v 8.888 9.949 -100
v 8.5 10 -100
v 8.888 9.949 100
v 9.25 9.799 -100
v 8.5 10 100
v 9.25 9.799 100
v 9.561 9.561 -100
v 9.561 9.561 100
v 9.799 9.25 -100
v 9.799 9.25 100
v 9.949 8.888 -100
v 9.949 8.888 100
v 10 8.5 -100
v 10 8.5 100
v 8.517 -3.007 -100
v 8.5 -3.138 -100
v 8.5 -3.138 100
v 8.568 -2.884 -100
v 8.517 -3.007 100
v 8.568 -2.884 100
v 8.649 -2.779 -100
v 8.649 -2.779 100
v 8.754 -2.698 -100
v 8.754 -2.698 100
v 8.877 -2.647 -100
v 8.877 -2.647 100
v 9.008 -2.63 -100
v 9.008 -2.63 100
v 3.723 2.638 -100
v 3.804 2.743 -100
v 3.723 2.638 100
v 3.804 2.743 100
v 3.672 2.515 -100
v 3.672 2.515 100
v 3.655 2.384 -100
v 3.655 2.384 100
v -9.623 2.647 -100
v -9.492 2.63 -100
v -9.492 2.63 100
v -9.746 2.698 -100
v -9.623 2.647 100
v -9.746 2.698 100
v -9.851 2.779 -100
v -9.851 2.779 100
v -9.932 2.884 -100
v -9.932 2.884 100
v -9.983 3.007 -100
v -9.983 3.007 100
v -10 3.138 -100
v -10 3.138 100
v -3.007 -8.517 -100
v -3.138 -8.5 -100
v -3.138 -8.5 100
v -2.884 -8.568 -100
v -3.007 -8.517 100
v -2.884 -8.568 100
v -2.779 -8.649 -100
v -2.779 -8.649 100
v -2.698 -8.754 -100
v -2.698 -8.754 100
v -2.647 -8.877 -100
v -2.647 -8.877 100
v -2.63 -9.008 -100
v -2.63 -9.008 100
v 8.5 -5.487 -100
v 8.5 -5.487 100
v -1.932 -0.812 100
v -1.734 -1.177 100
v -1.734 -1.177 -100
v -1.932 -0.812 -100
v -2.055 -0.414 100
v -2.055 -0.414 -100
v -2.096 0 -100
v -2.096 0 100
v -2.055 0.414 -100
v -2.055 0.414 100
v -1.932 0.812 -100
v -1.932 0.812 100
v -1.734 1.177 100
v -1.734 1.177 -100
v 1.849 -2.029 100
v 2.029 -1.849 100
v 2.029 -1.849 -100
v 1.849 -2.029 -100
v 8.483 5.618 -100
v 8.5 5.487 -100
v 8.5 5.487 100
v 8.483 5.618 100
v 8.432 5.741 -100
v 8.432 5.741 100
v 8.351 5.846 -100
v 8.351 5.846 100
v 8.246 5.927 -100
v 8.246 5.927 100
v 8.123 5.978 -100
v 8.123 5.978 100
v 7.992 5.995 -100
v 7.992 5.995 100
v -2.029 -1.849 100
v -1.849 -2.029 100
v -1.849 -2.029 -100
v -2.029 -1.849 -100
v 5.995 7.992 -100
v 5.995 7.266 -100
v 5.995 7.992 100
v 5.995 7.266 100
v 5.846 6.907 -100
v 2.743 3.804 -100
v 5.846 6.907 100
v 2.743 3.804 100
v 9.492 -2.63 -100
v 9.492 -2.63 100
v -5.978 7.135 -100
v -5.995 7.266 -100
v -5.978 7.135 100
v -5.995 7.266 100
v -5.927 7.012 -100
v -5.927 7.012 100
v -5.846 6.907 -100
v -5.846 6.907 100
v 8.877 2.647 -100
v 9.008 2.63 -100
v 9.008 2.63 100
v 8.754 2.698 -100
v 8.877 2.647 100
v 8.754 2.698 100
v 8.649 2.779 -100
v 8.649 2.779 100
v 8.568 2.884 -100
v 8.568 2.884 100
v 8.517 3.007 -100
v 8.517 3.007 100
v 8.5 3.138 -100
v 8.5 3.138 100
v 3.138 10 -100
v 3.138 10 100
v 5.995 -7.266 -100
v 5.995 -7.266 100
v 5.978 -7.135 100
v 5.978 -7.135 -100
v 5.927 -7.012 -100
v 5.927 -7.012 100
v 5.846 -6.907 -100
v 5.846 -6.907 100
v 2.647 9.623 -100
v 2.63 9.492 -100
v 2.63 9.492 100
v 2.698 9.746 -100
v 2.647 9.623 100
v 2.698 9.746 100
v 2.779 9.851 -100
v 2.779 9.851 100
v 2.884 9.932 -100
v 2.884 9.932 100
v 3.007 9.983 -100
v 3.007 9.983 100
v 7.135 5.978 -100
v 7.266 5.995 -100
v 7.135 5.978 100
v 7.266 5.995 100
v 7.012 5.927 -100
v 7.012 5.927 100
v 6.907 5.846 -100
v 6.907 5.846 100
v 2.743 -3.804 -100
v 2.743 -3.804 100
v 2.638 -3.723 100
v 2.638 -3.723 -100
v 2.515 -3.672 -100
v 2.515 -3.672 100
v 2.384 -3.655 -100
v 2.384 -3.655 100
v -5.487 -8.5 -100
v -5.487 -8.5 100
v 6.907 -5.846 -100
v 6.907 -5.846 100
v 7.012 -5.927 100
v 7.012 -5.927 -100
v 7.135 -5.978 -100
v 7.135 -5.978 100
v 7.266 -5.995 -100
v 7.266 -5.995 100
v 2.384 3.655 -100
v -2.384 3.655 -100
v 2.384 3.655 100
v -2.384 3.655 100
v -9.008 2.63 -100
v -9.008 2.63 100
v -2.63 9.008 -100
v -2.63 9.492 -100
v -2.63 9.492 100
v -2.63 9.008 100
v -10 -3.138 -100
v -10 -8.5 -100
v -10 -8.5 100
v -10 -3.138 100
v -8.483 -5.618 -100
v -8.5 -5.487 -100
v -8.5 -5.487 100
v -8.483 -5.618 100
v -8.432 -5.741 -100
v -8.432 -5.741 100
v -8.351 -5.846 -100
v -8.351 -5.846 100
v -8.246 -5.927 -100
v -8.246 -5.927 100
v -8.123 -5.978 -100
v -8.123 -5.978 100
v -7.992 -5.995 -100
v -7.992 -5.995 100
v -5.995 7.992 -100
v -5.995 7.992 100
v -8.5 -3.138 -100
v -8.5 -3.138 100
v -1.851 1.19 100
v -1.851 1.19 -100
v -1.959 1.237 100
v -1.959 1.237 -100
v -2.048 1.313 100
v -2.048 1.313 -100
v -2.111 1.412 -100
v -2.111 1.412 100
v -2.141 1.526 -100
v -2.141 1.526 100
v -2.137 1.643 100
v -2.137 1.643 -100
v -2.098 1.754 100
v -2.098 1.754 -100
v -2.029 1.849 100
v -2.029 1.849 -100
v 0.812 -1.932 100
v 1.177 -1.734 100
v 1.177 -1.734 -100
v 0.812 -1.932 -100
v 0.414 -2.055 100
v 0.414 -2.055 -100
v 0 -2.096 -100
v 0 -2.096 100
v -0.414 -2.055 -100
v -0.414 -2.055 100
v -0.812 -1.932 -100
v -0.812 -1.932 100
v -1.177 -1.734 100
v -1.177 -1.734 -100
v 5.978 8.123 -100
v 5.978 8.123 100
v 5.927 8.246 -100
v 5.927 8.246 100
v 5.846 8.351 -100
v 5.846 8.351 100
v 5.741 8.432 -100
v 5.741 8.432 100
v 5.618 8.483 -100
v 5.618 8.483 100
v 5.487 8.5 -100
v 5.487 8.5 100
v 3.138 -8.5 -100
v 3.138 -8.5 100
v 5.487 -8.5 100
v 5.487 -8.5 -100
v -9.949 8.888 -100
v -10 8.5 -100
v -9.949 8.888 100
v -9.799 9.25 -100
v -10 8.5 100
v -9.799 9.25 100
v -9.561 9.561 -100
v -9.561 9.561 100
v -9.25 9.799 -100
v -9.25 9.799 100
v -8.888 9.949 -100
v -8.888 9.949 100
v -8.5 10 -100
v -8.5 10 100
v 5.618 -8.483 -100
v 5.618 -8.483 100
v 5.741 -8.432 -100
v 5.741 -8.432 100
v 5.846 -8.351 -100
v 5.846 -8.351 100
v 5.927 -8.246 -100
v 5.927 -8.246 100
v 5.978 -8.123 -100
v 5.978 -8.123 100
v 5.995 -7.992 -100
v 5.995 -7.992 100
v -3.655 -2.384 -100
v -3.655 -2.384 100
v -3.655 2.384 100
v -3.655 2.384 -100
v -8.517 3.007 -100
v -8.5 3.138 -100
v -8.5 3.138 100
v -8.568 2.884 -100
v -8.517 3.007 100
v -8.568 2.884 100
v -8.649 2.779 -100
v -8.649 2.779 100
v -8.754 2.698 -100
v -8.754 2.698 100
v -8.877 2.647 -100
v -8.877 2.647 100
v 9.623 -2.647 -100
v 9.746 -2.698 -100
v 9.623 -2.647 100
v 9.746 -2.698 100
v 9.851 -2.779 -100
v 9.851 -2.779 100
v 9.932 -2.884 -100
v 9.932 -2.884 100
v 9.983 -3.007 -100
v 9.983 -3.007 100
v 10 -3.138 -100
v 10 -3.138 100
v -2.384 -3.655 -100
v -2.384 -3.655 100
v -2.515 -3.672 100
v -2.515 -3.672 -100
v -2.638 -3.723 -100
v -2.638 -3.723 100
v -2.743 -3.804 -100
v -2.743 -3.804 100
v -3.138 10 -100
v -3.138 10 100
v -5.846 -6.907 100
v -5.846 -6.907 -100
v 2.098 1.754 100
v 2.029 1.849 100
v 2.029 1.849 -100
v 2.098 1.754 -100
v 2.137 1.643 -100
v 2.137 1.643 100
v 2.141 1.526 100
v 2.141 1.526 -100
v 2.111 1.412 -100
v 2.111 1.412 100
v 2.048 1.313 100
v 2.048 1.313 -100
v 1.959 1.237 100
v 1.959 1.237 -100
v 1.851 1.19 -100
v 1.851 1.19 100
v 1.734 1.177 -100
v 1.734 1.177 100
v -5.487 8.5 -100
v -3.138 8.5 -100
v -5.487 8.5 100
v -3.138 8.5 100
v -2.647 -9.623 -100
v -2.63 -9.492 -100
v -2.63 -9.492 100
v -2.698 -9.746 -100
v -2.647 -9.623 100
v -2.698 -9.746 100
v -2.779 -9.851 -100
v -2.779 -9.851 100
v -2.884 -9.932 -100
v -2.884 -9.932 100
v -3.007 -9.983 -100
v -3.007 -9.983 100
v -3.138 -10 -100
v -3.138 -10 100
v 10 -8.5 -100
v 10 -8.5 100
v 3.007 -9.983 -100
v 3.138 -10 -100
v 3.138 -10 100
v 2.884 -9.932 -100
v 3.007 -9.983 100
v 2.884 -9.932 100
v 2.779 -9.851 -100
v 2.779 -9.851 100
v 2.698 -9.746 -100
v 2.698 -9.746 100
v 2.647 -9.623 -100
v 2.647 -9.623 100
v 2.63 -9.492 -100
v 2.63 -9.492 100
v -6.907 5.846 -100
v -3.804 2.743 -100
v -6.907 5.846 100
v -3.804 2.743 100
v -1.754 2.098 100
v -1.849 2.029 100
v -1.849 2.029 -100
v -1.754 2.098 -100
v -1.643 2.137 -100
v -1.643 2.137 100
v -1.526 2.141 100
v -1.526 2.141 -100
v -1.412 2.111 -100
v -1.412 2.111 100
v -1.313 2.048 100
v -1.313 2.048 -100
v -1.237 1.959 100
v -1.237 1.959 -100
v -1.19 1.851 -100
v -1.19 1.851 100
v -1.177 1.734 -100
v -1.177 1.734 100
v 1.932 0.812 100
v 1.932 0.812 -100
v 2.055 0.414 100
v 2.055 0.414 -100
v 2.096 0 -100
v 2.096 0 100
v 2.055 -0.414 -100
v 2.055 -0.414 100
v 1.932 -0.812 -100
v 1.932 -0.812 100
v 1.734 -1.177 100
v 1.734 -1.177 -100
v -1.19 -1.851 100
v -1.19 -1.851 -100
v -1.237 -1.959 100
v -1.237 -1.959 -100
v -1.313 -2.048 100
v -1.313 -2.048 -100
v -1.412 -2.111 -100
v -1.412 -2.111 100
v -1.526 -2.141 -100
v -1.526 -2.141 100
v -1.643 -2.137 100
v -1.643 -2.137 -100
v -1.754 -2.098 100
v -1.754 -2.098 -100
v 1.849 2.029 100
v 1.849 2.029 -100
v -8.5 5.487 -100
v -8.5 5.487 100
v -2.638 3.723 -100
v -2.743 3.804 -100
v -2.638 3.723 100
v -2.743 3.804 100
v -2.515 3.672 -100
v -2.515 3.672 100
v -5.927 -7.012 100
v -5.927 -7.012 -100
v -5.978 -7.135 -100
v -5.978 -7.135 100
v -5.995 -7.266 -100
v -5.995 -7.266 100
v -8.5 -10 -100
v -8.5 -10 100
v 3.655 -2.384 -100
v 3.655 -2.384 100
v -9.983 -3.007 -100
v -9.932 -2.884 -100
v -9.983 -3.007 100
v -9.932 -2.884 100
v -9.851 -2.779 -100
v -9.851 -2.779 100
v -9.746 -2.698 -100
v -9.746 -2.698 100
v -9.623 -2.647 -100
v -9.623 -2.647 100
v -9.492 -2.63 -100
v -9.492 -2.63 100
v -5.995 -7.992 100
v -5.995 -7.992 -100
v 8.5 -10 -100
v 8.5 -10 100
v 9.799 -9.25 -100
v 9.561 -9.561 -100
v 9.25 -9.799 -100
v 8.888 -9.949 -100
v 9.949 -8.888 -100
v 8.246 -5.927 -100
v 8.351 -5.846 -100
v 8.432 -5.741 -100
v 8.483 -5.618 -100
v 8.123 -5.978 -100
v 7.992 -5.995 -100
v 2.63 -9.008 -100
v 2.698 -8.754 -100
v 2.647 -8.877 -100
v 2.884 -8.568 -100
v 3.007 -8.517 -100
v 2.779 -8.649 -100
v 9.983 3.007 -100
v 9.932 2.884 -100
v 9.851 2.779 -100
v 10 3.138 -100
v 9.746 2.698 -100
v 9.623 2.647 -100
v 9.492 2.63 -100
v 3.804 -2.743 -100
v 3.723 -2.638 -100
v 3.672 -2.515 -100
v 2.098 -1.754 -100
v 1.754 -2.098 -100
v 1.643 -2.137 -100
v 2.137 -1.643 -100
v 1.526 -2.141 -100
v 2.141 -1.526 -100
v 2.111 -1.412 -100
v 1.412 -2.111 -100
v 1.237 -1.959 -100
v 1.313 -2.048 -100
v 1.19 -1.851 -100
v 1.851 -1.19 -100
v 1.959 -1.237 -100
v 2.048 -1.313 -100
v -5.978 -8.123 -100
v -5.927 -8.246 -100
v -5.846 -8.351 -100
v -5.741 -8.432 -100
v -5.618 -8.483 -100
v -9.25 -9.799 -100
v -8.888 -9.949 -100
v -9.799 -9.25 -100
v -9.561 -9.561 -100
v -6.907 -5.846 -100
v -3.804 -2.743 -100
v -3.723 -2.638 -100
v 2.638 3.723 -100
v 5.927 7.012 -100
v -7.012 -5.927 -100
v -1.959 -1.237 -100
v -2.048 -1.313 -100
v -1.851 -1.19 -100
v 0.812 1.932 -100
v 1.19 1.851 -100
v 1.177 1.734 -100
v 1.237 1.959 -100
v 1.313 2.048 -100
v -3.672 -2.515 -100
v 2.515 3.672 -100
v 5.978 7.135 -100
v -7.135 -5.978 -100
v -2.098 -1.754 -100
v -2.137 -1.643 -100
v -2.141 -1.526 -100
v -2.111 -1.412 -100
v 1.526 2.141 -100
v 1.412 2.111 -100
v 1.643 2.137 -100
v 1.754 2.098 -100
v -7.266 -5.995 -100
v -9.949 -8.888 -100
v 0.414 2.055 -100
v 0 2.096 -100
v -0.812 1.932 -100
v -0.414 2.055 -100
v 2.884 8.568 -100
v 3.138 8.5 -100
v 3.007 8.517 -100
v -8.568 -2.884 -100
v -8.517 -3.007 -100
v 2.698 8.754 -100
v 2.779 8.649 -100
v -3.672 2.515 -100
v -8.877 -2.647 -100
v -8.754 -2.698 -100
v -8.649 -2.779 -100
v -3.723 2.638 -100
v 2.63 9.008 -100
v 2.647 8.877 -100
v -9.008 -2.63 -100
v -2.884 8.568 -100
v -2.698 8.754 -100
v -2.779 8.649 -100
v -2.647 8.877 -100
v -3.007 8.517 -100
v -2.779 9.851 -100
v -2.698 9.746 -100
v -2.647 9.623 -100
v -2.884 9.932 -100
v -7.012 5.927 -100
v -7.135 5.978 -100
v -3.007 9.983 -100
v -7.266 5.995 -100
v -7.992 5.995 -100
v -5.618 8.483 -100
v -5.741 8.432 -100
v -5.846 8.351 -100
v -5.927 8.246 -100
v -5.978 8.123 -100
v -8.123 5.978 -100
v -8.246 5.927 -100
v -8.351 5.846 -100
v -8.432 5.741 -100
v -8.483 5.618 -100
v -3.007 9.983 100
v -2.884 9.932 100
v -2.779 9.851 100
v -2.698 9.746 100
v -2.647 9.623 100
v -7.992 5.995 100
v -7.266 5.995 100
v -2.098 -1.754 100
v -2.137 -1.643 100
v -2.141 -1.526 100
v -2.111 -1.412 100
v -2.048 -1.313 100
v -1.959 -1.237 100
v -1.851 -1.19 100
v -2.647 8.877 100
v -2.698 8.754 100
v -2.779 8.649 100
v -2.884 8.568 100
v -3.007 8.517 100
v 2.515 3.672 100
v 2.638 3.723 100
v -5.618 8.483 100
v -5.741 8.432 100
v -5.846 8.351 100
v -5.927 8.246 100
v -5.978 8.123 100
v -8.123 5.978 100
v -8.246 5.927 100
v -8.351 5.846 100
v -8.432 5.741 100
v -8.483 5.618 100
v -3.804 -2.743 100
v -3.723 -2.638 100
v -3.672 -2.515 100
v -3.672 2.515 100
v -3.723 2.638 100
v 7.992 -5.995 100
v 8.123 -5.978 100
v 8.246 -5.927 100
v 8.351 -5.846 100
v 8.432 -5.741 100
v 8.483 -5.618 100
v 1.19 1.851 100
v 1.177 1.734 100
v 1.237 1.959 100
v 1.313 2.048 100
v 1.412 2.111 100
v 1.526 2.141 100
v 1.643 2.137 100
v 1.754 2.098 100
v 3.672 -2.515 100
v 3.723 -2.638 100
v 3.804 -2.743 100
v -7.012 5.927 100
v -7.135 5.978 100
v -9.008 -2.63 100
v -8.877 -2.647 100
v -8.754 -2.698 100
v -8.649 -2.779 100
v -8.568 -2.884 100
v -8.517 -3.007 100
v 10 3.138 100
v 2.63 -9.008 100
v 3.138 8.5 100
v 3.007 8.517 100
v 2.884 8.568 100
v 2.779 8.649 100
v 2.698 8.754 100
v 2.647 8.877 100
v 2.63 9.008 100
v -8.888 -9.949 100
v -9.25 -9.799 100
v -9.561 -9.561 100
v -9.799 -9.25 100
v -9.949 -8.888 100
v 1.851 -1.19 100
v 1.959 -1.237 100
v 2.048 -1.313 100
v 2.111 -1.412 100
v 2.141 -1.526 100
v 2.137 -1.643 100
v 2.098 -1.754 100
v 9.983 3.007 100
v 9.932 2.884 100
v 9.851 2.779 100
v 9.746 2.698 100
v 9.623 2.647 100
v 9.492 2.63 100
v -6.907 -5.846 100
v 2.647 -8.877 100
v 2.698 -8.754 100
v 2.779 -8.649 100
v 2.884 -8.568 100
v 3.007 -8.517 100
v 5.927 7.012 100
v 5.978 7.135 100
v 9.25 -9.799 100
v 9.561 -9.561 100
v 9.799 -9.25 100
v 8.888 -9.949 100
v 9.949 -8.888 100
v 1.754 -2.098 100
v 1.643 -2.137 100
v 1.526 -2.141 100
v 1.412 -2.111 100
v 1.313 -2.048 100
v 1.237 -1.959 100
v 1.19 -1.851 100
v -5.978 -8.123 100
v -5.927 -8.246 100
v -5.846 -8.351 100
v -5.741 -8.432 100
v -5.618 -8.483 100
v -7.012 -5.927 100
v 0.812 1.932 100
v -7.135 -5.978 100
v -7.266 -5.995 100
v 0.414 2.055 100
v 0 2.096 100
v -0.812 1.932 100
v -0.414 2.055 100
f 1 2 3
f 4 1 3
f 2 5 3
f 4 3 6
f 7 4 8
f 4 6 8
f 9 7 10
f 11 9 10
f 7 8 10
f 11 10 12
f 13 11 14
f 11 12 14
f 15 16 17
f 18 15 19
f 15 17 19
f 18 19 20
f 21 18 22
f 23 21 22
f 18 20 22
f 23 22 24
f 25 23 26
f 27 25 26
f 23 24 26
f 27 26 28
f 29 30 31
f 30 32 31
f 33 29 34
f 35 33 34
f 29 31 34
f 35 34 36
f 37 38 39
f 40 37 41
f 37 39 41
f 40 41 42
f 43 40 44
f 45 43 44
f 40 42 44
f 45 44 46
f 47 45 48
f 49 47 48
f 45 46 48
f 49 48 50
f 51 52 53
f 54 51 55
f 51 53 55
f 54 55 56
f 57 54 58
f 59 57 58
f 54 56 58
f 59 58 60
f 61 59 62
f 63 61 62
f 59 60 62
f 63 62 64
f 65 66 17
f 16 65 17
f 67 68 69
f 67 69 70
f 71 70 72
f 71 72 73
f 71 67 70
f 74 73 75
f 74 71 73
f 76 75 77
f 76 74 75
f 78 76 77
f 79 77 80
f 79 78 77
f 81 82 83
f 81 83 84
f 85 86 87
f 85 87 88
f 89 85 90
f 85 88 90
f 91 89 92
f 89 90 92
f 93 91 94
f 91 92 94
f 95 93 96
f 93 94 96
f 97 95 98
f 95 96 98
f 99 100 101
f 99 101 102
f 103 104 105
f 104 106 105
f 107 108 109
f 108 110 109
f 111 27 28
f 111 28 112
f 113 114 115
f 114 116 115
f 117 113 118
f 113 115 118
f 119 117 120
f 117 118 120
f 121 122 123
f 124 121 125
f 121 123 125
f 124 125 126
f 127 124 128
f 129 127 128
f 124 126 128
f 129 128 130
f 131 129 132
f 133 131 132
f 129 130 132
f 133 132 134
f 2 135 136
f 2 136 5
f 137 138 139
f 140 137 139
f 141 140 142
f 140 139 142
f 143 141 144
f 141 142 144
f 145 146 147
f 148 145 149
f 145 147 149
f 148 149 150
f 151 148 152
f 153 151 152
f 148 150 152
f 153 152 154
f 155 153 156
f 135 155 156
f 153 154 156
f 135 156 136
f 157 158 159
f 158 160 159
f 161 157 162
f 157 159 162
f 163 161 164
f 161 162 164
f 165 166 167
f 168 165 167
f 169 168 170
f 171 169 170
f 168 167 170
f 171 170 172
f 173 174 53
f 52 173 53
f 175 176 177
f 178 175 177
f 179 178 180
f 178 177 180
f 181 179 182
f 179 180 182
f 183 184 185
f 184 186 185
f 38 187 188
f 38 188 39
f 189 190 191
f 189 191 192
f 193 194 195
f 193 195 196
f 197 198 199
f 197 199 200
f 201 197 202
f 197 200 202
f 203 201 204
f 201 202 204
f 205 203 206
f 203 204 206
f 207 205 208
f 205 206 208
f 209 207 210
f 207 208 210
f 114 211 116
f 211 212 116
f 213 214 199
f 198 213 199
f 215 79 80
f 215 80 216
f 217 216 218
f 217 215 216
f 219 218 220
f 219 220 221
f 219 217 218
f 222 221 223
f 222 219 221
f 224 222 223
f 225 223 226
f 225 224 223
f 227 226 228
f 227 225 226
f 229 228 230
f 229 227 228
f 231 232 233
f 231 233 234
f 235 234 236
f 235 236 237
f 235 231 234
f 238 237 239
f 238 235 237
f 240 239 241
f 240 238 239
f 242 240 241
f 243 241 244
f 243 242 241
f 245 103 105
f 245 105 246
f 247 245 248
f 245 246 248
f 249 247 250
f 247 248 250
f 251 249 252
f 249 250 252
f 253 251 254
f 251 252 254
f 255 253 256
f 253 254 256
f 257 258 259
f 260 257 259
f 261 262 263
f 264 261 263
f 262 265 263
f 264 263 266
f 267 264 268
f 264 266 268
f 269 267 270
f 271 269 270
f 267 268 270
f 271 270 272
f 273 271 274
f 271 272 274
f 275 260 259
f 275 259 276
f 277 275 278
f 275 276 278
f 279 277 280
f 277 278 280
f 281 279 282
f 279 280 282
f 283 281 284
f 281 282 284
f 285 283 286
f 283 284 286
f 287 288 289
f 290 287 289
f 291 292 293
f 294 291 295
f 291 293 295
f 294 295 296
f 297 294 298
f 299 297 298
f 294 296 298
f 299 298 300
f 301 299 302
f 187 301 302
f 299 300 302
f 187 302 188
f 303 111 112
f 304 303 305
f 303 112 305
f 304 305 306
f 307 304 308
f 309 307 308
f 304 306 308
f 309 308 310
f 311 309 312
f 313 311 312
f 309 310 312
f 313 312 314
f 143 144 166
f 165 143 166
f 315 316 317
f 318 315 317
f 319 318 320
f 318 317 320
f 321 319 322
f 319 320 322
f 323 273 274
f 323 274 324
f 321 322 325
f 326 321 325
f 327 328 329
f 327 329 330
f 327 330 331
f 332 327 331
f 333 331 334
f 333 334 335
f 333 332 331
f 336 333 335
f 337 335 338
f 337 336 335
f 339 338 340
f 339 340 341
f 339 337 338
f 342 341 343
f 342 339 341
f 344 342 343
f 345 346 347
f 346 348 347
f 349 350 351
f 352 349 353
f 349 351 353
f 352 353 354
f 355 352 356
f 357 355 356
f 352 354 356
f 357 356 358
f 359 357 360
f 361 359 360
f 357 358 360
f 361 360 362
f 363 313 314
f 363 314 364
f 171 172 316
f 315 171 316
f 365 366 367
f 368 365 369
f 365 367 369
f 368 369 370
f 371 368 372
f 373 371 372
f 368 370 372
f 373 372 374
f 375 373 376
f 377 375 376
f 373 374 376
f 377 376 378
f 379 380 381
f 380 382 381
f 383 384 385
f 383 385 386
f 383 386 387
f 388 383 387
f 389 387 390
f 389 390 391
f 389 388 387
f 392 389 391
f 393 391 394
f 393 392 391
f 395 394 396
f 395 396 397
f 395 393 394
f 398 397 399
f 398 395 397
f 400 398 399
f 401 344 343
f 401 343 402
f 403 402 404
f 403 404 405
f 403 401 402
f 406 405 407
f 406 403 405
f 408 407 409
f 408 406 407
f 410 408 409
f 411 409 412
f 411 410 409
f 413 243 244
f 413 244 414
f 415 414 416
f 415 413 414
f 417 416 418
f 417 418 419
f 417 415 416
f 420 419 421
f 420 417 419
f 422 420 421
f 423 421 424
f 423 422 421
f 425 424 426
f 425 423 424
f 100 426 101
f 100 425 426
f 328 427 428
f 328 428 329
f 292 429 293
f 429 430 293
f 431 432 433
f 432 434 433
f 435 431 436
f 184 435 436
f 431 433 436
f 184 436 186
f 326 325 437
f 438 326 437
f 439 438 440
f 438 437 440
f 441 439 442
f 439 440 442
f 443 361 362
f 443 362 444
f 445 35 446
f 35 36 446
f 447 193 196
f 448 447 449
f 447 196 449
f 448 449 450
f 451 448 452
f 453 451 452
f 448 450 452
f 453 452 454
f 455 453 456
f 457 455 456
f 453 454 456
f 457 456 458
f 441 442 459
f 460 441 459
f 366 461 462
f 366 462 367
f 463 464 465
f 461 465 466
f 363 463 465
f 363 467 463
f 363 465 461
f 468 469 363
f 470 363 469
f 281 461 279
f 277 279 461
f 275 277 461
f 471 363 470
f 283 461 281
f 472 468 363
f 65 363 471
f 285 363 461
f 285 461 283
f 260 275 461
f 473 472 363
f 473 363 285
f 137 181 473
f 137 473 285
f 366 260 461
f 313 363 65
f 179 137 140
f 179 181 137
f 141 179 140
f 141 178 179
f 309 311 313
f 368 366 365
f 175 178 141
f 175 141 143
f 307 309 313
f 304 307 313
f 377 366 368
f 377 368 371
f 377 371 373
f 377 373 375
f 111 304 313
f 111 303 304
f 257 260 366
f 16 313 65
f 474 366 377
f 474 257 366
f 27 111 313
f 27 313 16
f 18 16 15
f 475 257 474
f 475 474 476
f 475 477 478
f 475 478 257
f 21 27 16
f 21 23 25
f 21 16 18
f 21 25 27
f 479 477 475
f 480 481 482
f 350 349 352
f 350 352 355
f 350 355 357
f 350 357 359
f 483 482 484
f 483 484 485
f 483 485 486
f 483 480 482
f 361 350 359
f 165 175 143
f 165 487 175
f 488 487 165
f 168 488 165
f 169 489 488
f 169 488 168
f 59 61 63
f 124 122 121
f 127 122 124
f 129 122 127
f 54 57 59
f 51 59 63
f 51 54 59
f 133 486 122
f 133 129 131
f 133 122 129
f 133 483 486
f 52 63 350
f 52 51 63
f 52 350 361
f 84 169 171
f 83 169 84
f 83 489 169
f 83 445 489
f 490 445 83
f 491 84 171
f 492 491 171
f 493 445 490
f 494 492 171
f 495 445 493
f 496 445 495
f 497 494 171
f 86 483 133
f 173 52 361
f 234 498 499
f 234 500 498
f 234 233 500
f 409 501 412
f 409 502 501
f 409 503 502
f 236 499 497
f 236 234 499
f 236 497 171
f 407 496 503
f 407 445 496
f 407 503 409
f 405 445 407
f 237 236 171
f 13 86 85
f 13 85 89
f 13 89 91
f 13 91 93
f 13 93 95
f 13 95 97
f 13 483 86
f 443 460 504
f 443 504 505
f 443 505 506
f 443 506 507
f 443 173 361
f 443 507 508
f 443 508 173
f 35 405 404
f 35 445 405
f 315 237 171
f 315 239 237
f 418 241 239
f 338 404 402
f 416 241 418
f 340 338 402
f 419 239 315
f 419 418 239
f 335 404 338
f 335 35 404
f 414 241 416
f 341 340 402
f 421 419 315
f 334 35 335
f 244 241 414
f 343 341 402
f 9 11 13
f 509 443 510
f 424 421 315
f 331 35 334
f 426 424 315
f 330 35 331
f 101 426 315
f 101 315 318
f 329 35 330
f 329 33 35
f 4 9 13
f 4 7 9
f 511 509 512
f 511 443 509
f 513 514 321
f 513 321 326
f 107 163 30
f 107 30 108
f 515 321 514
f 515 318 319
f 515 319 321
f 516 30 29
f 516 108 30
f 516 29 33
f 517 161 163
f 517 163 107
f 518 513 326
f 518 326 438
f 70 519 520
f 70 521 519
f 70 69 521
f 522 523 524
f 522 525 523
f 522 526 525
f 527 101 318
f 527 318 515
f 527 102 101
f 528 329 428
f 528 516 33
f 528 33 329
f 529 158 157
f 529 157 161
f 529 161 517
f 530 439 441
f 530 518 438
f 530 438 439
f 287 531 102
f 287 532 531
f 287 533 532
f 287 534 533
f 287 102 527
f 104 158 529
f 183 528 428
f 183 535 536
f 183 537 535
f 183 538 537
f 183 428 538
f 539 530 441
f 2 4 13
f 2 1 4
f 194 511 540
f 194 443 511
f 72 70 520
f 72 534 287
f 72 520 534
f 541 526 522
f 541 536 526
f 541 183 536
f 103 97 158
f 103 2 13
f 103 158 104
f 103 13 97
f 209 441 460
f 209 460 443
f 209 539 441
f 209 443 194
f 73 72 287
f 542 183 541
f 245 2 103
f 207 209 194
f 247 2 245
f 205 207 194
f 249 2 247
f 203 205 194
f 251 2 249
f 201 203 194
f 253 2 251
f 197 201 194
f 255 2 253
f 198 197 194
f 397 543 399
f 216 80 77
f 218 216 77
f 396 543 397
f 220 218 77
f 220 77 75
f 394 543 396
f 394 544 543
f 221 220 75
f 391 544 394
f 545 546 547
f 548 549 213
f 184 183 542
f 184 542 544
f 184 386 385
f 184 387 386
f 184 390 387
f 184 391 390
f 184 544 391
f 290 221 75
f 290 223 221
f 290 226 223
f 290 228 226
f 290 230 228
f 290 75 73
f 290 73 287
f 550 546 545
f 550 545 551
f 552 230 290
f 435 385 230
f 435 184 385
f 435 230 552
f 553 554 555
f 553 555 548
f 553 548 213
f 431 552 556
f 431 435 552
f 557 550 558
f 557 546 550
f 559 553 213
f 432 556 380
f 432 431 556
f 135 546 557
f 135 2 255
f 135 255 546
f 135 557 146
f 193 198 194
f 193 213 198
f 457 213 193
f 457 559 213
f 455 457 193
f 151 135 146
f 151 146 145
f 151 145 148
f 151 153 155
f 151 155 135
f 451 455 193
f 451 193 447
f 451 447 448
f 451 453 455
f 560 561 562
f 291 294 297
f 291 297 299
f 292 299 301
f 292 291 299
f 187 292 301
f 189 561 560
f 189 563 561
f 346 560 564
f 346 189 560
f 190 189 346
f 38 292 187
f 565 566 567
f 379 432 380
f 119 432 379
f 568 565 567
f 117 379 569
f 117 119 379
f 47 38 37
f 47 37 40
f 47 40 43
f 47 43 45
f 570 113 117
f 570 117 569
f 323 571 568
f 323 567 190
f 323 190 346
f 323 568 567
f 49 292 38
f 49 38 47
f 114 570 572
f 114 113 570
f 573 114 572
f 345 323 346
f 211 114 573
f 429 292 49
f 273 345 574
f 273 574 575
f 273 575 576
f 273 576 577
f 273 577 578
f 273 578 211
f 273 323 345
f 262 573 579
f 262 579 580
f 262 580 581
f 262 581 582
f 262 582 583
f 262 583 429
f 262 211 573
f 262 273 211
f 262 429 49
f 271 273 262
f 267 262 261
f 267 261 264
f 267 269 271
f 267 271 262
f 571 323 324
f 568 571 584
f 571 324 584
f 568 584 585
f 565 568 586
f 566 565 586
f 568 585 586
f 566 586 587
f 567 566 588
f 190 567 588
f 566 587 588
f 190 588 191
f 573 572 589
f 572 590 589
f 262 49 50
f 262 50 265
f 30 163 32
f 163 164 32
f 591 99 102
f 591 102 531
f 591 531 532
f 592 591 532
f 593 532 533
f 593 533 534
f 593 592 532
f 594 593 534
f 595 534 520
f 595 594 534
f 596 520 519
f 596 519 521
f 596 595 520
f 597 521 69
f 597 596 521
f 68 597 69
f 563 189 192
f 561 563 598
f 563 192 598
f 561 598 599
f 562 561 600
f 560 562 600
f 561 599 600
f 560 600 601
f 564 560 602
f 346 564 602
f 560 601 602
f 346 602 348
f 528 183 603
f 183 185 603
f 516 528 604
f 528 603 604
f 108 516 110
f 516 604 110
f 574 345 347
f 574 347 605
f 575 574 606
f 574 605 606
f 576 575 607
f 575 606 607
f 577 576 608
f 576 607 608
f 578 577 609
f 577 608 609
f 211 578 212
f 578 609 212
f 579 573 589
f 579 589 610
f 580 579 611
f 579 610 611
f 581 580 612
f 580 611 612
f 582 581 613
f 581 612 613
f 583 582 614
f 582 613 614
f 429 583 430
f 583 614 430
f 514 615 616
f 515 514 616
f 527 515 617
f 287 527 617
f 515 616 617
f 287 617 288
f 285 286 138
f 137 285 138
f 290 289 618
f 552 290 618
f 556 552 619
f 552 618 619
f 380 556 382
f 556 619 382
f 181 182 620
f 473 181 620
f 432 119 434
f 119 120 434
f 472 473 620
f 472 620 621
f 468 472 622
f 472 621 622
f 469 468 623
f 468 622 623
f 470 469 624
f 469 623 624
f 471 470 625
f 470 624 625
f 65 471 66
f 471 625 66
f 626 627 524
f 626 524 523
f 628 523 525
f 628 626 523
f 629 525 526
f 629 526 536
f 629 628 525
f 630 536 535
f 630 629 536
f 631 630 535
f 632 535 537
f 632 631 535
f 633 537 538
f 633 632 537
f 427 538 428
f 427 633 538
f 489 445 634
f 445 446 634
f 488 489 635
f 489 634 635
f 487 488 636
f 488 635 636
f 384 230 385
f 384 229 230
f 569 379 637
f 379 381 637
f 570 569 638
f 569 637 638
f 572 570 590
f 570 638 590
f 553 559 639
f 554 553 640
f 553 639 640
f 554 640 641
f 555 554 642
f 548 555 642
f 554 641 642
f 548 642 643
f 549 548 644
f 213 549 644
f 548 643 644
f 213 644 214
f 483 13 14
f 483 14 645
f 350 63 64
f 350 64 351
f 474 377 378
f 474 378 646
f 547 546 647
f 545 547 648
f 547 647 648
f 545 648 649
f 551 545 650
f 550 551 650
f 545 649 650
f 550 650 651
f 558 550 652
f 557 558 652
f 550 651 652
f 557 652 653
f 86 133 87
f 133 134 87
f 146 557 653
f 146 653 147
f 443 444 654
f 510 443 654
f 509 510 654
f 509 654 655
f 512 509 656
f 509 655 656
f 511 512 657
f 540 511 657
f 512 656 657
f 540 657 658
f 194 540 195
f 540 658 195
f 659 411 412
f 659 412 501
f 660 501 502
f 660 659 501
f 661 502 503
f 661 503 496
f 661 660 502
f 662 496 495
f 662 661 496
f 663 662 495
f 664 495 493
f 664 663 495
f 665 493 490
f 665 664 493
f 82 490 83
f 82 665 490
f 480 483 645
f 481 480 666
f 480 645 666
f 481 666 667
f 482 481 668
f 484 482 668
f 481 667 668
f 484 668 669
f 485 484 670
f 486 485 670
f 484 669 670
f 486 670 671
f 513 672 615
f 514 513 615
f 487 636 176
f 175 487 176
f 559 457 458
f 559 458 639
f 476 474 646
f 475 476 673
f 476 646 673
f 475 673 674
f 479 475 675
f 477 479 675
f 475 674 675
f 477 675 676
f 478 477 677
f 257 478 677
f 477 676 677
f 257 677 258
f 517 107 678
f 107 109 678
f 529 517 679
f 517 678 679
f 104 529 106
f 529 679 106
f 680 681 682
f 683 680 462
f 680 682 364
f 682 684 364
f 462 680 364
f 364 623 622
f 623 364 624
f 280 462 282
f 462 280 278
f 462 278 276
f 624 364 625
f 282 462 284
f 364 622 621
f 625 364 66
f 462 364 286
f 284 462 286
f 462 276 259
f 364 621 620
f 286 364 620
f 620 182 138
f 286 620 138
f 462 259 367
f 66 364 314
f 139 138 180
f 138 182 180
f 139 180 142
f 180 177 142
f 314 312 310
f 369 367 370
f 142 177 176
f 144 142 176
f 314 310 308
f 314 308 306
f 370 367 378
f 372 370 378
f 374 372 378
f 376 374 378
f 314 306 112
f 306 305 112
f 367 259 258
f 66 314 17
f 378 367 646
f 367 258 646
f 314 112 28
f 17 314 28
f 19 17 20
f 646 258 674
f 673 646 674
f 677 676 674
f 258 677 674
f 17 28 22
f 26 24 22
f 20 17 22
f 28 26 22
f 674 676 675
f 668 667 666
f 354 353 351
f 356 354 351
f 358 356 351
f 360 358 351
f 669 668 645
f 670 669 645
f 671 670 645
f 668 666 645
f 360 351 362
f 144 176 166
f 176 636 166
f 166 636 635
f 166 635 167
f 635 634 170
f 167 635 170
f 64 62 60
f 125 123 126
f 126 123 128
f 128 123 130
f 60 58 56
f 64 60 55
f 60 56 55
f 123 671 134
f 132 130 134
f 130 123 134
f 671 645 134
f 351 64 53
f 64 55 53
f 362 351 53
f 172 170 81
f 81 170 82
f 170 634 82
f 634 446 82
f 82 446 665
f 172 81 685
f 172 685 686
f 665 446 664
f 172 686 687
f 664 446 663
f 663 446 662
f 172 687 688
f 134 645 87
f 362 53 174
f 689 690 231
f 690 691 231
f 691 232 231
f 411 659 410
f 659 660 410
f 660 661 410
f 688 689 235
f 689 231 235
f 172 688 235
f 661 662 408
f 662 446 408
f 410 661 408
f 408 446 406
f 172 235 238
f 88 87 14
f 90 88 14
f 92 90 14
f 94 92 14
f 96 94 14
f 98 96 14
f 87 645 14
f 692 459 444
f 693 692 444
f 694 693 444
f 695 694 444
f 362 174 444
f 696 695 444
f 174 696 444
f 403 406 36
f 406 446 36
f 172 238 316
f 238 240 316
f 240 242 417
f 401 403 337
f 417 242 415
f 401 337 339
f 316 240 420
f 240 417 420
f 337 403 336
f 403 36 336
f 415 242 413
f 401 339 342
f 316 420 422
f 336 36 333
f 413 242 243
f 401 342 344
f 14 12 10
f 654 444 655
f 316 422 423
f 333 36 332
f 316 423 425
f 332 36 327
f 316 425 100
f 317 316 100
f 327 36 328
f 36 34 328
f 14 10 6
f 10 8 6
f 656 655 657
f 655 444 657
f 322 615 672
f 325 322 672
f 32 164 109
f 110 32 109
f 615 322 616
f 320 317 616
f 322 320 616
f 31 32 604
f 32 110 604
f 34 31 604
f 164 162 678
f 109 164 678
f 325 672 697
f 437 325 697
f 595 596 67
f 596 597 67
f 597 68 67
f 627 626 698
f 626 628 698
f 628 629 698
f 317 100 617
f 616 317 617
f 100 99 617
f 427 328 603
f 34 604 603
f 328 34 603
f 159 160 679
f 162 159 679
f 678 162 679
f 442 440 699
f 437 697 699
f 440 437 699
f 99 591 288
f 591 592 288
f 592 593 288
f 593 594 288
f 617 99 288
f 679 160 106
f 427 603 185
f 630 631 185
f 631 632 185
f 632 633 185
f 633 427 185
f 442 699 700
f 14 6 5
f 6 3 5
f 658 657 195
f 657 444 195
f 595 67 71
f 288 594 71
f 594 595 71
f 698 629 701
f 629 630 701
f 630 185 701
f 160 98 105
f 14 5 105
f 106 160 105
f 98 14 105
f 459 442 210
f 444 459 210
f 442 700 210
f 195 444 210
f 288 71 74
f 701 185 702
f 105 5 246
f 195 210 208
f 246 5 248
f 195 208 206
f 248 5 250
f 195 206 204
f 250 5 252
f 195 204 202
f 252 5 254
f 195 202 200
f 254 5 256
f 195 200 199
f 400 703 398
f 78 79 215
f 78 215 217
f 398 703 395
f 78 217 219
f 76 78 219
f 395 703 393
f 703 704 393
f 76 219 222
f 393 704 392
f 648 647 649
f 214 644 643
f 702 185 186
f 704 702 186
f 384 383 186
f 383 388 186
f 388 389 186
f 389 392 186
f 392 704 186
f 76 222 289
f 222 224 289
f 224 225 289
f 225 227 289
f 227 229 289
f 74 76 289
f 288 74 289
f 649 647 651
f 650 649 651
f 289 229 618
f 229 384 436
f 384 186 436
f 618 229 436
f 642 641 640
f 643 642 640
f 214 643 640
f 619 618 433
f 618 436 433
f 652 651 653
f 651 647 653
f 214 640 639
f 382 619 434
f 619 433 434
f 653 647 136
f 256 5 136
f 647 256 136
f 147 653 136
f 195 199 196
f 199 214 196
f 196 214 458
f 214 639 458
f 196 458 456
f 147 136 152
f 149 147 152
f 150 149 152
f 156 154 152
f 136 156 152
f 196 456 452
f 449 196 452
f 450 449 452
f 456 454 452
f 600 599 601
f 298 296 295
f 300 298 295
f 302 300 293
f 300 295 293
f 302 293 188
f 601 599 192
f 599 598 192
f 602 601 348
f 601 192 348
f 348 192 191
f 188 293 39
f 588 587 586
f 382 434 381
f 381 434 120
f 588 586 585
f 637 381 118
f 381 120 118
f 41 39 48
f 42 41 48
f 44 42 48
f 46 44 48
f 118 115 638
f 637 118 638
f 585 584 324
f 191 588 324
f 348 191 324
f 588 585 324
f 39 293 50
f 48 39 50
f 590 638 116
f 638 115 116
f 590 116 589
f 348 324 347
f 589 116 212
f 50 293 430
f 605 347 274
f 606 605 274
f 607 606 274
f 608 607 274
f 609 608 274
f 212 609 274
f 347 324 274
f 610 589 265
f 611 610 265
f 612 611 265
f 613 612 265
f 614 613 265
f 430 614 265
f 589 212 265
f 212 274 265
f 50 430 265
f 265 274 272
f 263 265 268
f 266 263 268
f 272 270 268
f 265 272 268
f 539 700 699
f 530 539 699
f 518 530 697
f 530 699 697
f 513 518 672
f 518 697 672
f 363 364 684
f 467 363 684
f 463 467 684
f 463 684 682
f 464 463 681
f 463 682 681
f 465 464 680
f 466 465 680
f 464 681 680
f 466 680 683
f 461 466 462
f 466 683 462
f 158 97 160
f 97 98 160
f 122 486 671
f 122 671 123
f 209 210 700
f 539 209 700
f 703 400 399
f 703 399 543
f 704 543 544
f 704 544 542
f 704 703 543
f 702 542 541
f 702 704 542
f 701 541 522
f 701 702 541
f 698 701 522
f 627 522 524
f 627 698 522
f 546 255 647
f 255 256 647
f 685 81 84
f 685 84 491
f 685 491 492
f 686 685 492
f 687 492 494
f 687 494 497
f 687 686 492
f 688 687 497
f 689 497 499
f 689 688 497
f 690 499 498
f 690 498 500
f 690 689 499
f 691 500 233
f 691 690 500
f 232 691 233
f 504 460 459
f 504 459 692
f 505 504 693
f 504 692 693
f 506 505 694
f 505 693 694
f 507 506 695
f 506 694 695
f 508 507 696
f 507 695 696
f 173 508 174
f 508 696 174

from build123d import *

# Parameters (mm, degrees)
F_2020_PROFILE_DEPTH = 100


with BuildPart() as part:
    # Sketch1 → 2020 Profile (new, symmetric)
    with BuildSketch(Plane.XY):
        with BuildLine():
            Line((-3.655, 0), (-3.655, 2.383919339))
            ThreePointArc((-3.655, 2.383919339), (-3.693669197, 2.578322522), (-3.803789755, 2.743129583))
            Line((-3.803789755, 2.743129583), (-6.906870417, 5.846210245))
            ThreePointArc((-6.906870417, 5.846210245), (-7.071677478, 5.956330803), (-7.266080661, 5.995))
            Line((-7.266080661, 5.995), (-7.992, 5.995))
            ThreePointArc((-7.992, 5.995), (-8.351210245, 5.846210245), (-8.5, 5.487))
            Line((-8.5, 5.487), (-8.5, 3.138))
            ThreePointArc((-8.5, 3.138), (-8.648789755, 2.778789755), (-9.008, 2.63))
            Line((-9.008, 2.63), (-9.492, 2.63))
            ThreePointArc((-9.492, 2.63), (-9.851210245, 2.778789755), (-10, 3.138))
            Line((-10, 3.138), (-10, 8.5))
            ThreePointArc((-10, 8.5), (-9.560660172, 9.560660172), (-8.5, 10))
            Line((-8.5, 10), (-3.138, 10))
            ThreePointArc((-3.138, 10), (-2.778789755, 9.851210245), (-2.63, 9.492))
            Line((-2.63, 9.492), (-2.63, 9.008))
            ThreePointArc((-2.63, 9.008), (-2.778789755, 8.648789755), (-3.138, 8.5))
            Line((-3.138, 8.5), (-5.487, 8.5))
            ThreePointArc((-5.487, 8.5), (-5.846210245, 8.351210245), (-5.995, 7.992))
            Line((-5.995, 7.992), (-5.995, 7.266080661))
            ThreePointArc((-5.995, 7.266080661), (-5.956330803, 7.071677478), (-5.846210245, 6.906870417))
            Line((-5.846210245, 6.906870417), (-2.743129583, 3.803789755))
            ThreePointArc((-2.743129583, 3.803789755), (-2.578322522, 3.693669197), (-2.383919339, 3.655))
            Line((-2.383919339, 3.655), (0, 3.655))
            Line((0, 3.655), (2.383919339, 3.655))
            ThreePointArc((2.383919339, 3.655), (2.578322522, 3.693669197), (2.743129583, 3.803789755))
            Line((2.743129583, 3.803789755), (5.846210245, 6.906870417))
            ThreePointArc((5.846210245, 6.906870417), (5.956330803, 7.071677478), (5.995, 7.266080661))
            Line((5.995, 7.266080661), (5.995, 7.992))
            ThreePointArc((5.995, 7.992), (5.846210245, 8.351210245), (5.487, 8.5))
            Line((5.487, 8.5), (3.138, 8.5))
            ThreePointArc((3.138, 8.5), (2.778789755, 8.648789755), (2.63, 9.008))
            Line((2.63, 9.008), (2.63, 9.492))
            ThreePointArc((2.63, 9.492), (2.778789755, 9.851210245), (3.138, 10))
            Line((3.138, 10), (8.5, 10))
            ThreePointArc((8.5, 10), (9.560660172, 9.560660172), (10, 8.5))
            Line((10, 8.5), (10, 3.138))
            ThreePointArc((10, 3.138), (9.851210245, 2.778789755), (9.492, 2.63))
            Line((9.492, 2.63), (9.008, 2.63))
            ThreePointArc((9.008, 2.63), (8.648789755, 2.778789755), (8.5, 3.138))
            Line((8.5, 3.138), (8.5, 5.487))
            ThreePointArc((8.5, 5.487), (8.351210245, 5.846210245), (7.992, 5.995))
            Line((7.992, 5.995), (7.266080661, 5.995))
            ThreePointArc((7.266080661, 5.995), (7.071677478, 5.956330803), (6.906870417, 5.846210245))
            Line((6.906870417, 5.846210245), (3.803789755, 2.743129583))
            ThreePointArc((3.803789755, 2.743129583), (3.693669197, 2.578322522), (3.655, 2.383919339))
            Line((3.655, 2.383919339), (3.655, 0))
            Line((3.655, 0), (3.655, -2.383919339))
            ThreePointArc((3.655, -2.383919339), (3.693669197, -2.578322522), (3.803789755, -2.743129583))
            Line((3.803789755, -2.743129583), (6.906870417, -5.846210245))
            ThreePointArc((6.906870417, -5.846210245), (7.071677478, -5.956330803), (7.266080661, -5.995))
            Line((7.266080661, -5.995), (7.992, -5.995))
            ThreePointArc((7.992, -5.995), (8.351210245, -5.846210245), (8.5, -5.487))
            Line((8.5, -5.487), (8.5, -3.138))
            ThreePointArc((8.5, -3.138), (8.648789755, -2.778789755), (9.008, -2.63))
            Line((9.008, -2.63), (9.492, -2.63))
            ThreePointArc((9.492, -2.63), (9.851210245, -2.778789755), (10, -3.138))
            Line((10, -3.138), (10, -8.5))
            ThreePointArc((10, -8.5), (9.560660172, -9.560660172), (8.5, -10))
            Line((8.5, -10), (3.138, -10))
            ThreePointArc((3.138, -10), (2.778789755, -9.851210245), (2.63, -9.492))
            Line((2.63, -9.492), (2.63, -9.008))
            ThreePointArc((2.63, -9.008), (2.778789755, -8.648789755), (3.138, -8.5))
            Line((3.138, -8.5), (5.487, -8.5))
            ThreePointArc((5.487, -8.5), (5.846210245, -8.351210245), (5.995, -7.992))
            Line((5.995, -7.992), (5.995, -7.266080661))
            ThreePointArc((5.995, -7.266080661), (5.956330803, -7.071677478), (5.846210245, -6.906870417))
            Line((5.846210245, -6.906870417), (2.743129583, -3.803789755))
            ThreePointArc((2.743129583, -3.803789755), (2.578322522, -3.693669197), (2.383919339, -3.655))
            Line((2.383919339, -3.655), (0, -3.655))
            Line((0, -3.655), (-2.383919339, -3.655))
            ThreePointArc((-2.383919339, -3.655), (-2.578322522, -3.693669197), (-2.743129583, -3.803789755))
            Line((-2.743129583, -3.803789755), (-5.846210245, -6.906870417))
            ThreePointArc((-5.846210245, -6.906870417), (-5.956330803, -7.071677478), (-5.995, -7.266080661))
            Line((-5.995, -7.266080661), (-5.995, -7.992))
            ThreePointArc((-5.995, -7.992), (-5.846210245, -8.351210245), (-5.487, -8.5))
            Line((-5.487, -8.5), (-3.138, -8.5))
            ThreePointArc((-3.138, -8.5), (-2.778789755, -8.648789755), (-2.63, -9.008))
            Line((-2.63, -9.008), (-2.63, -9.492))
            ThreePointArc((-2.63, -9.492), (-2.778789755, -9.851210245), (-3.138, -10))
            Line((-3.138, -10), (-8.5, -10))
            ThreePointArc((-8.5, -10), (-9.560660172, -9.560660172), (-10, -8.5))
            Line((-10, -8.5), (-10, -3.138))
            ThreePointArc((-10, -3.138), (-9.851210245, -2.778789755), (-9.492, -2.63))
            Line((-9.492, -2.63), (-9.008, -2.63))
            ThreePointArc((-9.008, -2.63), (-8.648789755, -2.778789755), (-8.5, -3.138))
            Line((-8.5, -3.138), (-8.5, -5.487))
            ThreePointArc((-8.5, -5.487), (-8.351210245, -5.846210245), (-7.992, -5.995))
            Line((-7.992, -5.995), (-7.266080661, -5.995))
            ThreePointArc((-7.266080661, -5.995), (-7.071677478, -5.956330803), (-6.906870417, -5.846210245))
            Line((-6.906870417, -5.846210245), (-3.803789755, -2.743129583))
            ThreePointArc((-3.803789755, -2.743129583), (-3.693669197, -2.578322522), (-3.655, -2.383919339))
            Line((-3.655, -2.383919339), (-3.655, 0))
        make_face()
        with BuildLine():
            Line((-2.028687234, 1.848687546), (-1.848687546, 2.028687234))
            ThreePointArc((-1.848687546, 2.028687234), (-1.412354366, 2.11078896), (-1.177278935, 1.734136762))
            ThreePointArc((-1.177278935, 1.734136762), (-0.615818702, 2.003492782), (0, 2.096))
            ThreePointArc((0, 2.096), (0.615818702, 2.003492782), (1.177278935, 1.734136762))
            ThreePointArc((1.177278935, 1.734136762), (1.412354366, 2.11078896), (1.848687546, 2.028687234))
            Line((1.848687546, 2.028687234), (2.028687234, 1.848687546))
            ThreePointArc((2.028687234, 1.848687546), (2.11078896, 1.412354366), (1.734136762, 1.177278935))
            ThreePointArc((1.734136762, 1.177278935), (2.003492782, 0.615818702), (2.096, 0))
            ThreePointArc((2.096, 0), (2.003492782, -0.615818702), (1.734136762, -1.177278935))
            ThreePointArc((1.734136762, -1.177278935), (2.11078896, -1.412354366), (2.028687234, -1.848687546))
            Line((2.028687234, -1.848687546), (1.848687546, -2.028687234))
            ThreePointArc((1.848687546, -2.028687234), (1.412354366, -2.11078896), (1.177278935, -1.734136762))
            ThreePointArc((1.177278935, -1.734136762), (0.615818702, -2.003492782), (0, -2.096))
            ThreePointArc((0, -2.096), (-0.615818702, -2.003492782), (-1.177278935, -1.734136762))
            ThreePointArc((-1.177278935, -1.734136762), (-1.412354366, -2.11078896), (-1.848687546, -2.028687234))
            Line((-1.848687546, -2.028687234), (-2.028687234, -1.848687546))
            ThreePointArc((-2.028687234, -1.848687546), (-2.11078896, -1.412354366), (-1.734136762, -1.177278935))
            ThreePointArc((-1.734136762, -1.177278935), (-2.003492782, -0.615818702), (-2.096, 0))
            ThreePointArc((-2.096, 0), (-2.003492782, 0.615818702), (-1.734136762, 1.177278935))
            ThreePointArc((-1.734136762, 1.177278935), (-2.11078896, 1.412354366), (-2.028687234, 1.848687546))
        make_face(mode=Mode.SUBTRACT)
    extrude(amount=F_2020_PROFILE_DEPTH, both=True)


solid = part.part
